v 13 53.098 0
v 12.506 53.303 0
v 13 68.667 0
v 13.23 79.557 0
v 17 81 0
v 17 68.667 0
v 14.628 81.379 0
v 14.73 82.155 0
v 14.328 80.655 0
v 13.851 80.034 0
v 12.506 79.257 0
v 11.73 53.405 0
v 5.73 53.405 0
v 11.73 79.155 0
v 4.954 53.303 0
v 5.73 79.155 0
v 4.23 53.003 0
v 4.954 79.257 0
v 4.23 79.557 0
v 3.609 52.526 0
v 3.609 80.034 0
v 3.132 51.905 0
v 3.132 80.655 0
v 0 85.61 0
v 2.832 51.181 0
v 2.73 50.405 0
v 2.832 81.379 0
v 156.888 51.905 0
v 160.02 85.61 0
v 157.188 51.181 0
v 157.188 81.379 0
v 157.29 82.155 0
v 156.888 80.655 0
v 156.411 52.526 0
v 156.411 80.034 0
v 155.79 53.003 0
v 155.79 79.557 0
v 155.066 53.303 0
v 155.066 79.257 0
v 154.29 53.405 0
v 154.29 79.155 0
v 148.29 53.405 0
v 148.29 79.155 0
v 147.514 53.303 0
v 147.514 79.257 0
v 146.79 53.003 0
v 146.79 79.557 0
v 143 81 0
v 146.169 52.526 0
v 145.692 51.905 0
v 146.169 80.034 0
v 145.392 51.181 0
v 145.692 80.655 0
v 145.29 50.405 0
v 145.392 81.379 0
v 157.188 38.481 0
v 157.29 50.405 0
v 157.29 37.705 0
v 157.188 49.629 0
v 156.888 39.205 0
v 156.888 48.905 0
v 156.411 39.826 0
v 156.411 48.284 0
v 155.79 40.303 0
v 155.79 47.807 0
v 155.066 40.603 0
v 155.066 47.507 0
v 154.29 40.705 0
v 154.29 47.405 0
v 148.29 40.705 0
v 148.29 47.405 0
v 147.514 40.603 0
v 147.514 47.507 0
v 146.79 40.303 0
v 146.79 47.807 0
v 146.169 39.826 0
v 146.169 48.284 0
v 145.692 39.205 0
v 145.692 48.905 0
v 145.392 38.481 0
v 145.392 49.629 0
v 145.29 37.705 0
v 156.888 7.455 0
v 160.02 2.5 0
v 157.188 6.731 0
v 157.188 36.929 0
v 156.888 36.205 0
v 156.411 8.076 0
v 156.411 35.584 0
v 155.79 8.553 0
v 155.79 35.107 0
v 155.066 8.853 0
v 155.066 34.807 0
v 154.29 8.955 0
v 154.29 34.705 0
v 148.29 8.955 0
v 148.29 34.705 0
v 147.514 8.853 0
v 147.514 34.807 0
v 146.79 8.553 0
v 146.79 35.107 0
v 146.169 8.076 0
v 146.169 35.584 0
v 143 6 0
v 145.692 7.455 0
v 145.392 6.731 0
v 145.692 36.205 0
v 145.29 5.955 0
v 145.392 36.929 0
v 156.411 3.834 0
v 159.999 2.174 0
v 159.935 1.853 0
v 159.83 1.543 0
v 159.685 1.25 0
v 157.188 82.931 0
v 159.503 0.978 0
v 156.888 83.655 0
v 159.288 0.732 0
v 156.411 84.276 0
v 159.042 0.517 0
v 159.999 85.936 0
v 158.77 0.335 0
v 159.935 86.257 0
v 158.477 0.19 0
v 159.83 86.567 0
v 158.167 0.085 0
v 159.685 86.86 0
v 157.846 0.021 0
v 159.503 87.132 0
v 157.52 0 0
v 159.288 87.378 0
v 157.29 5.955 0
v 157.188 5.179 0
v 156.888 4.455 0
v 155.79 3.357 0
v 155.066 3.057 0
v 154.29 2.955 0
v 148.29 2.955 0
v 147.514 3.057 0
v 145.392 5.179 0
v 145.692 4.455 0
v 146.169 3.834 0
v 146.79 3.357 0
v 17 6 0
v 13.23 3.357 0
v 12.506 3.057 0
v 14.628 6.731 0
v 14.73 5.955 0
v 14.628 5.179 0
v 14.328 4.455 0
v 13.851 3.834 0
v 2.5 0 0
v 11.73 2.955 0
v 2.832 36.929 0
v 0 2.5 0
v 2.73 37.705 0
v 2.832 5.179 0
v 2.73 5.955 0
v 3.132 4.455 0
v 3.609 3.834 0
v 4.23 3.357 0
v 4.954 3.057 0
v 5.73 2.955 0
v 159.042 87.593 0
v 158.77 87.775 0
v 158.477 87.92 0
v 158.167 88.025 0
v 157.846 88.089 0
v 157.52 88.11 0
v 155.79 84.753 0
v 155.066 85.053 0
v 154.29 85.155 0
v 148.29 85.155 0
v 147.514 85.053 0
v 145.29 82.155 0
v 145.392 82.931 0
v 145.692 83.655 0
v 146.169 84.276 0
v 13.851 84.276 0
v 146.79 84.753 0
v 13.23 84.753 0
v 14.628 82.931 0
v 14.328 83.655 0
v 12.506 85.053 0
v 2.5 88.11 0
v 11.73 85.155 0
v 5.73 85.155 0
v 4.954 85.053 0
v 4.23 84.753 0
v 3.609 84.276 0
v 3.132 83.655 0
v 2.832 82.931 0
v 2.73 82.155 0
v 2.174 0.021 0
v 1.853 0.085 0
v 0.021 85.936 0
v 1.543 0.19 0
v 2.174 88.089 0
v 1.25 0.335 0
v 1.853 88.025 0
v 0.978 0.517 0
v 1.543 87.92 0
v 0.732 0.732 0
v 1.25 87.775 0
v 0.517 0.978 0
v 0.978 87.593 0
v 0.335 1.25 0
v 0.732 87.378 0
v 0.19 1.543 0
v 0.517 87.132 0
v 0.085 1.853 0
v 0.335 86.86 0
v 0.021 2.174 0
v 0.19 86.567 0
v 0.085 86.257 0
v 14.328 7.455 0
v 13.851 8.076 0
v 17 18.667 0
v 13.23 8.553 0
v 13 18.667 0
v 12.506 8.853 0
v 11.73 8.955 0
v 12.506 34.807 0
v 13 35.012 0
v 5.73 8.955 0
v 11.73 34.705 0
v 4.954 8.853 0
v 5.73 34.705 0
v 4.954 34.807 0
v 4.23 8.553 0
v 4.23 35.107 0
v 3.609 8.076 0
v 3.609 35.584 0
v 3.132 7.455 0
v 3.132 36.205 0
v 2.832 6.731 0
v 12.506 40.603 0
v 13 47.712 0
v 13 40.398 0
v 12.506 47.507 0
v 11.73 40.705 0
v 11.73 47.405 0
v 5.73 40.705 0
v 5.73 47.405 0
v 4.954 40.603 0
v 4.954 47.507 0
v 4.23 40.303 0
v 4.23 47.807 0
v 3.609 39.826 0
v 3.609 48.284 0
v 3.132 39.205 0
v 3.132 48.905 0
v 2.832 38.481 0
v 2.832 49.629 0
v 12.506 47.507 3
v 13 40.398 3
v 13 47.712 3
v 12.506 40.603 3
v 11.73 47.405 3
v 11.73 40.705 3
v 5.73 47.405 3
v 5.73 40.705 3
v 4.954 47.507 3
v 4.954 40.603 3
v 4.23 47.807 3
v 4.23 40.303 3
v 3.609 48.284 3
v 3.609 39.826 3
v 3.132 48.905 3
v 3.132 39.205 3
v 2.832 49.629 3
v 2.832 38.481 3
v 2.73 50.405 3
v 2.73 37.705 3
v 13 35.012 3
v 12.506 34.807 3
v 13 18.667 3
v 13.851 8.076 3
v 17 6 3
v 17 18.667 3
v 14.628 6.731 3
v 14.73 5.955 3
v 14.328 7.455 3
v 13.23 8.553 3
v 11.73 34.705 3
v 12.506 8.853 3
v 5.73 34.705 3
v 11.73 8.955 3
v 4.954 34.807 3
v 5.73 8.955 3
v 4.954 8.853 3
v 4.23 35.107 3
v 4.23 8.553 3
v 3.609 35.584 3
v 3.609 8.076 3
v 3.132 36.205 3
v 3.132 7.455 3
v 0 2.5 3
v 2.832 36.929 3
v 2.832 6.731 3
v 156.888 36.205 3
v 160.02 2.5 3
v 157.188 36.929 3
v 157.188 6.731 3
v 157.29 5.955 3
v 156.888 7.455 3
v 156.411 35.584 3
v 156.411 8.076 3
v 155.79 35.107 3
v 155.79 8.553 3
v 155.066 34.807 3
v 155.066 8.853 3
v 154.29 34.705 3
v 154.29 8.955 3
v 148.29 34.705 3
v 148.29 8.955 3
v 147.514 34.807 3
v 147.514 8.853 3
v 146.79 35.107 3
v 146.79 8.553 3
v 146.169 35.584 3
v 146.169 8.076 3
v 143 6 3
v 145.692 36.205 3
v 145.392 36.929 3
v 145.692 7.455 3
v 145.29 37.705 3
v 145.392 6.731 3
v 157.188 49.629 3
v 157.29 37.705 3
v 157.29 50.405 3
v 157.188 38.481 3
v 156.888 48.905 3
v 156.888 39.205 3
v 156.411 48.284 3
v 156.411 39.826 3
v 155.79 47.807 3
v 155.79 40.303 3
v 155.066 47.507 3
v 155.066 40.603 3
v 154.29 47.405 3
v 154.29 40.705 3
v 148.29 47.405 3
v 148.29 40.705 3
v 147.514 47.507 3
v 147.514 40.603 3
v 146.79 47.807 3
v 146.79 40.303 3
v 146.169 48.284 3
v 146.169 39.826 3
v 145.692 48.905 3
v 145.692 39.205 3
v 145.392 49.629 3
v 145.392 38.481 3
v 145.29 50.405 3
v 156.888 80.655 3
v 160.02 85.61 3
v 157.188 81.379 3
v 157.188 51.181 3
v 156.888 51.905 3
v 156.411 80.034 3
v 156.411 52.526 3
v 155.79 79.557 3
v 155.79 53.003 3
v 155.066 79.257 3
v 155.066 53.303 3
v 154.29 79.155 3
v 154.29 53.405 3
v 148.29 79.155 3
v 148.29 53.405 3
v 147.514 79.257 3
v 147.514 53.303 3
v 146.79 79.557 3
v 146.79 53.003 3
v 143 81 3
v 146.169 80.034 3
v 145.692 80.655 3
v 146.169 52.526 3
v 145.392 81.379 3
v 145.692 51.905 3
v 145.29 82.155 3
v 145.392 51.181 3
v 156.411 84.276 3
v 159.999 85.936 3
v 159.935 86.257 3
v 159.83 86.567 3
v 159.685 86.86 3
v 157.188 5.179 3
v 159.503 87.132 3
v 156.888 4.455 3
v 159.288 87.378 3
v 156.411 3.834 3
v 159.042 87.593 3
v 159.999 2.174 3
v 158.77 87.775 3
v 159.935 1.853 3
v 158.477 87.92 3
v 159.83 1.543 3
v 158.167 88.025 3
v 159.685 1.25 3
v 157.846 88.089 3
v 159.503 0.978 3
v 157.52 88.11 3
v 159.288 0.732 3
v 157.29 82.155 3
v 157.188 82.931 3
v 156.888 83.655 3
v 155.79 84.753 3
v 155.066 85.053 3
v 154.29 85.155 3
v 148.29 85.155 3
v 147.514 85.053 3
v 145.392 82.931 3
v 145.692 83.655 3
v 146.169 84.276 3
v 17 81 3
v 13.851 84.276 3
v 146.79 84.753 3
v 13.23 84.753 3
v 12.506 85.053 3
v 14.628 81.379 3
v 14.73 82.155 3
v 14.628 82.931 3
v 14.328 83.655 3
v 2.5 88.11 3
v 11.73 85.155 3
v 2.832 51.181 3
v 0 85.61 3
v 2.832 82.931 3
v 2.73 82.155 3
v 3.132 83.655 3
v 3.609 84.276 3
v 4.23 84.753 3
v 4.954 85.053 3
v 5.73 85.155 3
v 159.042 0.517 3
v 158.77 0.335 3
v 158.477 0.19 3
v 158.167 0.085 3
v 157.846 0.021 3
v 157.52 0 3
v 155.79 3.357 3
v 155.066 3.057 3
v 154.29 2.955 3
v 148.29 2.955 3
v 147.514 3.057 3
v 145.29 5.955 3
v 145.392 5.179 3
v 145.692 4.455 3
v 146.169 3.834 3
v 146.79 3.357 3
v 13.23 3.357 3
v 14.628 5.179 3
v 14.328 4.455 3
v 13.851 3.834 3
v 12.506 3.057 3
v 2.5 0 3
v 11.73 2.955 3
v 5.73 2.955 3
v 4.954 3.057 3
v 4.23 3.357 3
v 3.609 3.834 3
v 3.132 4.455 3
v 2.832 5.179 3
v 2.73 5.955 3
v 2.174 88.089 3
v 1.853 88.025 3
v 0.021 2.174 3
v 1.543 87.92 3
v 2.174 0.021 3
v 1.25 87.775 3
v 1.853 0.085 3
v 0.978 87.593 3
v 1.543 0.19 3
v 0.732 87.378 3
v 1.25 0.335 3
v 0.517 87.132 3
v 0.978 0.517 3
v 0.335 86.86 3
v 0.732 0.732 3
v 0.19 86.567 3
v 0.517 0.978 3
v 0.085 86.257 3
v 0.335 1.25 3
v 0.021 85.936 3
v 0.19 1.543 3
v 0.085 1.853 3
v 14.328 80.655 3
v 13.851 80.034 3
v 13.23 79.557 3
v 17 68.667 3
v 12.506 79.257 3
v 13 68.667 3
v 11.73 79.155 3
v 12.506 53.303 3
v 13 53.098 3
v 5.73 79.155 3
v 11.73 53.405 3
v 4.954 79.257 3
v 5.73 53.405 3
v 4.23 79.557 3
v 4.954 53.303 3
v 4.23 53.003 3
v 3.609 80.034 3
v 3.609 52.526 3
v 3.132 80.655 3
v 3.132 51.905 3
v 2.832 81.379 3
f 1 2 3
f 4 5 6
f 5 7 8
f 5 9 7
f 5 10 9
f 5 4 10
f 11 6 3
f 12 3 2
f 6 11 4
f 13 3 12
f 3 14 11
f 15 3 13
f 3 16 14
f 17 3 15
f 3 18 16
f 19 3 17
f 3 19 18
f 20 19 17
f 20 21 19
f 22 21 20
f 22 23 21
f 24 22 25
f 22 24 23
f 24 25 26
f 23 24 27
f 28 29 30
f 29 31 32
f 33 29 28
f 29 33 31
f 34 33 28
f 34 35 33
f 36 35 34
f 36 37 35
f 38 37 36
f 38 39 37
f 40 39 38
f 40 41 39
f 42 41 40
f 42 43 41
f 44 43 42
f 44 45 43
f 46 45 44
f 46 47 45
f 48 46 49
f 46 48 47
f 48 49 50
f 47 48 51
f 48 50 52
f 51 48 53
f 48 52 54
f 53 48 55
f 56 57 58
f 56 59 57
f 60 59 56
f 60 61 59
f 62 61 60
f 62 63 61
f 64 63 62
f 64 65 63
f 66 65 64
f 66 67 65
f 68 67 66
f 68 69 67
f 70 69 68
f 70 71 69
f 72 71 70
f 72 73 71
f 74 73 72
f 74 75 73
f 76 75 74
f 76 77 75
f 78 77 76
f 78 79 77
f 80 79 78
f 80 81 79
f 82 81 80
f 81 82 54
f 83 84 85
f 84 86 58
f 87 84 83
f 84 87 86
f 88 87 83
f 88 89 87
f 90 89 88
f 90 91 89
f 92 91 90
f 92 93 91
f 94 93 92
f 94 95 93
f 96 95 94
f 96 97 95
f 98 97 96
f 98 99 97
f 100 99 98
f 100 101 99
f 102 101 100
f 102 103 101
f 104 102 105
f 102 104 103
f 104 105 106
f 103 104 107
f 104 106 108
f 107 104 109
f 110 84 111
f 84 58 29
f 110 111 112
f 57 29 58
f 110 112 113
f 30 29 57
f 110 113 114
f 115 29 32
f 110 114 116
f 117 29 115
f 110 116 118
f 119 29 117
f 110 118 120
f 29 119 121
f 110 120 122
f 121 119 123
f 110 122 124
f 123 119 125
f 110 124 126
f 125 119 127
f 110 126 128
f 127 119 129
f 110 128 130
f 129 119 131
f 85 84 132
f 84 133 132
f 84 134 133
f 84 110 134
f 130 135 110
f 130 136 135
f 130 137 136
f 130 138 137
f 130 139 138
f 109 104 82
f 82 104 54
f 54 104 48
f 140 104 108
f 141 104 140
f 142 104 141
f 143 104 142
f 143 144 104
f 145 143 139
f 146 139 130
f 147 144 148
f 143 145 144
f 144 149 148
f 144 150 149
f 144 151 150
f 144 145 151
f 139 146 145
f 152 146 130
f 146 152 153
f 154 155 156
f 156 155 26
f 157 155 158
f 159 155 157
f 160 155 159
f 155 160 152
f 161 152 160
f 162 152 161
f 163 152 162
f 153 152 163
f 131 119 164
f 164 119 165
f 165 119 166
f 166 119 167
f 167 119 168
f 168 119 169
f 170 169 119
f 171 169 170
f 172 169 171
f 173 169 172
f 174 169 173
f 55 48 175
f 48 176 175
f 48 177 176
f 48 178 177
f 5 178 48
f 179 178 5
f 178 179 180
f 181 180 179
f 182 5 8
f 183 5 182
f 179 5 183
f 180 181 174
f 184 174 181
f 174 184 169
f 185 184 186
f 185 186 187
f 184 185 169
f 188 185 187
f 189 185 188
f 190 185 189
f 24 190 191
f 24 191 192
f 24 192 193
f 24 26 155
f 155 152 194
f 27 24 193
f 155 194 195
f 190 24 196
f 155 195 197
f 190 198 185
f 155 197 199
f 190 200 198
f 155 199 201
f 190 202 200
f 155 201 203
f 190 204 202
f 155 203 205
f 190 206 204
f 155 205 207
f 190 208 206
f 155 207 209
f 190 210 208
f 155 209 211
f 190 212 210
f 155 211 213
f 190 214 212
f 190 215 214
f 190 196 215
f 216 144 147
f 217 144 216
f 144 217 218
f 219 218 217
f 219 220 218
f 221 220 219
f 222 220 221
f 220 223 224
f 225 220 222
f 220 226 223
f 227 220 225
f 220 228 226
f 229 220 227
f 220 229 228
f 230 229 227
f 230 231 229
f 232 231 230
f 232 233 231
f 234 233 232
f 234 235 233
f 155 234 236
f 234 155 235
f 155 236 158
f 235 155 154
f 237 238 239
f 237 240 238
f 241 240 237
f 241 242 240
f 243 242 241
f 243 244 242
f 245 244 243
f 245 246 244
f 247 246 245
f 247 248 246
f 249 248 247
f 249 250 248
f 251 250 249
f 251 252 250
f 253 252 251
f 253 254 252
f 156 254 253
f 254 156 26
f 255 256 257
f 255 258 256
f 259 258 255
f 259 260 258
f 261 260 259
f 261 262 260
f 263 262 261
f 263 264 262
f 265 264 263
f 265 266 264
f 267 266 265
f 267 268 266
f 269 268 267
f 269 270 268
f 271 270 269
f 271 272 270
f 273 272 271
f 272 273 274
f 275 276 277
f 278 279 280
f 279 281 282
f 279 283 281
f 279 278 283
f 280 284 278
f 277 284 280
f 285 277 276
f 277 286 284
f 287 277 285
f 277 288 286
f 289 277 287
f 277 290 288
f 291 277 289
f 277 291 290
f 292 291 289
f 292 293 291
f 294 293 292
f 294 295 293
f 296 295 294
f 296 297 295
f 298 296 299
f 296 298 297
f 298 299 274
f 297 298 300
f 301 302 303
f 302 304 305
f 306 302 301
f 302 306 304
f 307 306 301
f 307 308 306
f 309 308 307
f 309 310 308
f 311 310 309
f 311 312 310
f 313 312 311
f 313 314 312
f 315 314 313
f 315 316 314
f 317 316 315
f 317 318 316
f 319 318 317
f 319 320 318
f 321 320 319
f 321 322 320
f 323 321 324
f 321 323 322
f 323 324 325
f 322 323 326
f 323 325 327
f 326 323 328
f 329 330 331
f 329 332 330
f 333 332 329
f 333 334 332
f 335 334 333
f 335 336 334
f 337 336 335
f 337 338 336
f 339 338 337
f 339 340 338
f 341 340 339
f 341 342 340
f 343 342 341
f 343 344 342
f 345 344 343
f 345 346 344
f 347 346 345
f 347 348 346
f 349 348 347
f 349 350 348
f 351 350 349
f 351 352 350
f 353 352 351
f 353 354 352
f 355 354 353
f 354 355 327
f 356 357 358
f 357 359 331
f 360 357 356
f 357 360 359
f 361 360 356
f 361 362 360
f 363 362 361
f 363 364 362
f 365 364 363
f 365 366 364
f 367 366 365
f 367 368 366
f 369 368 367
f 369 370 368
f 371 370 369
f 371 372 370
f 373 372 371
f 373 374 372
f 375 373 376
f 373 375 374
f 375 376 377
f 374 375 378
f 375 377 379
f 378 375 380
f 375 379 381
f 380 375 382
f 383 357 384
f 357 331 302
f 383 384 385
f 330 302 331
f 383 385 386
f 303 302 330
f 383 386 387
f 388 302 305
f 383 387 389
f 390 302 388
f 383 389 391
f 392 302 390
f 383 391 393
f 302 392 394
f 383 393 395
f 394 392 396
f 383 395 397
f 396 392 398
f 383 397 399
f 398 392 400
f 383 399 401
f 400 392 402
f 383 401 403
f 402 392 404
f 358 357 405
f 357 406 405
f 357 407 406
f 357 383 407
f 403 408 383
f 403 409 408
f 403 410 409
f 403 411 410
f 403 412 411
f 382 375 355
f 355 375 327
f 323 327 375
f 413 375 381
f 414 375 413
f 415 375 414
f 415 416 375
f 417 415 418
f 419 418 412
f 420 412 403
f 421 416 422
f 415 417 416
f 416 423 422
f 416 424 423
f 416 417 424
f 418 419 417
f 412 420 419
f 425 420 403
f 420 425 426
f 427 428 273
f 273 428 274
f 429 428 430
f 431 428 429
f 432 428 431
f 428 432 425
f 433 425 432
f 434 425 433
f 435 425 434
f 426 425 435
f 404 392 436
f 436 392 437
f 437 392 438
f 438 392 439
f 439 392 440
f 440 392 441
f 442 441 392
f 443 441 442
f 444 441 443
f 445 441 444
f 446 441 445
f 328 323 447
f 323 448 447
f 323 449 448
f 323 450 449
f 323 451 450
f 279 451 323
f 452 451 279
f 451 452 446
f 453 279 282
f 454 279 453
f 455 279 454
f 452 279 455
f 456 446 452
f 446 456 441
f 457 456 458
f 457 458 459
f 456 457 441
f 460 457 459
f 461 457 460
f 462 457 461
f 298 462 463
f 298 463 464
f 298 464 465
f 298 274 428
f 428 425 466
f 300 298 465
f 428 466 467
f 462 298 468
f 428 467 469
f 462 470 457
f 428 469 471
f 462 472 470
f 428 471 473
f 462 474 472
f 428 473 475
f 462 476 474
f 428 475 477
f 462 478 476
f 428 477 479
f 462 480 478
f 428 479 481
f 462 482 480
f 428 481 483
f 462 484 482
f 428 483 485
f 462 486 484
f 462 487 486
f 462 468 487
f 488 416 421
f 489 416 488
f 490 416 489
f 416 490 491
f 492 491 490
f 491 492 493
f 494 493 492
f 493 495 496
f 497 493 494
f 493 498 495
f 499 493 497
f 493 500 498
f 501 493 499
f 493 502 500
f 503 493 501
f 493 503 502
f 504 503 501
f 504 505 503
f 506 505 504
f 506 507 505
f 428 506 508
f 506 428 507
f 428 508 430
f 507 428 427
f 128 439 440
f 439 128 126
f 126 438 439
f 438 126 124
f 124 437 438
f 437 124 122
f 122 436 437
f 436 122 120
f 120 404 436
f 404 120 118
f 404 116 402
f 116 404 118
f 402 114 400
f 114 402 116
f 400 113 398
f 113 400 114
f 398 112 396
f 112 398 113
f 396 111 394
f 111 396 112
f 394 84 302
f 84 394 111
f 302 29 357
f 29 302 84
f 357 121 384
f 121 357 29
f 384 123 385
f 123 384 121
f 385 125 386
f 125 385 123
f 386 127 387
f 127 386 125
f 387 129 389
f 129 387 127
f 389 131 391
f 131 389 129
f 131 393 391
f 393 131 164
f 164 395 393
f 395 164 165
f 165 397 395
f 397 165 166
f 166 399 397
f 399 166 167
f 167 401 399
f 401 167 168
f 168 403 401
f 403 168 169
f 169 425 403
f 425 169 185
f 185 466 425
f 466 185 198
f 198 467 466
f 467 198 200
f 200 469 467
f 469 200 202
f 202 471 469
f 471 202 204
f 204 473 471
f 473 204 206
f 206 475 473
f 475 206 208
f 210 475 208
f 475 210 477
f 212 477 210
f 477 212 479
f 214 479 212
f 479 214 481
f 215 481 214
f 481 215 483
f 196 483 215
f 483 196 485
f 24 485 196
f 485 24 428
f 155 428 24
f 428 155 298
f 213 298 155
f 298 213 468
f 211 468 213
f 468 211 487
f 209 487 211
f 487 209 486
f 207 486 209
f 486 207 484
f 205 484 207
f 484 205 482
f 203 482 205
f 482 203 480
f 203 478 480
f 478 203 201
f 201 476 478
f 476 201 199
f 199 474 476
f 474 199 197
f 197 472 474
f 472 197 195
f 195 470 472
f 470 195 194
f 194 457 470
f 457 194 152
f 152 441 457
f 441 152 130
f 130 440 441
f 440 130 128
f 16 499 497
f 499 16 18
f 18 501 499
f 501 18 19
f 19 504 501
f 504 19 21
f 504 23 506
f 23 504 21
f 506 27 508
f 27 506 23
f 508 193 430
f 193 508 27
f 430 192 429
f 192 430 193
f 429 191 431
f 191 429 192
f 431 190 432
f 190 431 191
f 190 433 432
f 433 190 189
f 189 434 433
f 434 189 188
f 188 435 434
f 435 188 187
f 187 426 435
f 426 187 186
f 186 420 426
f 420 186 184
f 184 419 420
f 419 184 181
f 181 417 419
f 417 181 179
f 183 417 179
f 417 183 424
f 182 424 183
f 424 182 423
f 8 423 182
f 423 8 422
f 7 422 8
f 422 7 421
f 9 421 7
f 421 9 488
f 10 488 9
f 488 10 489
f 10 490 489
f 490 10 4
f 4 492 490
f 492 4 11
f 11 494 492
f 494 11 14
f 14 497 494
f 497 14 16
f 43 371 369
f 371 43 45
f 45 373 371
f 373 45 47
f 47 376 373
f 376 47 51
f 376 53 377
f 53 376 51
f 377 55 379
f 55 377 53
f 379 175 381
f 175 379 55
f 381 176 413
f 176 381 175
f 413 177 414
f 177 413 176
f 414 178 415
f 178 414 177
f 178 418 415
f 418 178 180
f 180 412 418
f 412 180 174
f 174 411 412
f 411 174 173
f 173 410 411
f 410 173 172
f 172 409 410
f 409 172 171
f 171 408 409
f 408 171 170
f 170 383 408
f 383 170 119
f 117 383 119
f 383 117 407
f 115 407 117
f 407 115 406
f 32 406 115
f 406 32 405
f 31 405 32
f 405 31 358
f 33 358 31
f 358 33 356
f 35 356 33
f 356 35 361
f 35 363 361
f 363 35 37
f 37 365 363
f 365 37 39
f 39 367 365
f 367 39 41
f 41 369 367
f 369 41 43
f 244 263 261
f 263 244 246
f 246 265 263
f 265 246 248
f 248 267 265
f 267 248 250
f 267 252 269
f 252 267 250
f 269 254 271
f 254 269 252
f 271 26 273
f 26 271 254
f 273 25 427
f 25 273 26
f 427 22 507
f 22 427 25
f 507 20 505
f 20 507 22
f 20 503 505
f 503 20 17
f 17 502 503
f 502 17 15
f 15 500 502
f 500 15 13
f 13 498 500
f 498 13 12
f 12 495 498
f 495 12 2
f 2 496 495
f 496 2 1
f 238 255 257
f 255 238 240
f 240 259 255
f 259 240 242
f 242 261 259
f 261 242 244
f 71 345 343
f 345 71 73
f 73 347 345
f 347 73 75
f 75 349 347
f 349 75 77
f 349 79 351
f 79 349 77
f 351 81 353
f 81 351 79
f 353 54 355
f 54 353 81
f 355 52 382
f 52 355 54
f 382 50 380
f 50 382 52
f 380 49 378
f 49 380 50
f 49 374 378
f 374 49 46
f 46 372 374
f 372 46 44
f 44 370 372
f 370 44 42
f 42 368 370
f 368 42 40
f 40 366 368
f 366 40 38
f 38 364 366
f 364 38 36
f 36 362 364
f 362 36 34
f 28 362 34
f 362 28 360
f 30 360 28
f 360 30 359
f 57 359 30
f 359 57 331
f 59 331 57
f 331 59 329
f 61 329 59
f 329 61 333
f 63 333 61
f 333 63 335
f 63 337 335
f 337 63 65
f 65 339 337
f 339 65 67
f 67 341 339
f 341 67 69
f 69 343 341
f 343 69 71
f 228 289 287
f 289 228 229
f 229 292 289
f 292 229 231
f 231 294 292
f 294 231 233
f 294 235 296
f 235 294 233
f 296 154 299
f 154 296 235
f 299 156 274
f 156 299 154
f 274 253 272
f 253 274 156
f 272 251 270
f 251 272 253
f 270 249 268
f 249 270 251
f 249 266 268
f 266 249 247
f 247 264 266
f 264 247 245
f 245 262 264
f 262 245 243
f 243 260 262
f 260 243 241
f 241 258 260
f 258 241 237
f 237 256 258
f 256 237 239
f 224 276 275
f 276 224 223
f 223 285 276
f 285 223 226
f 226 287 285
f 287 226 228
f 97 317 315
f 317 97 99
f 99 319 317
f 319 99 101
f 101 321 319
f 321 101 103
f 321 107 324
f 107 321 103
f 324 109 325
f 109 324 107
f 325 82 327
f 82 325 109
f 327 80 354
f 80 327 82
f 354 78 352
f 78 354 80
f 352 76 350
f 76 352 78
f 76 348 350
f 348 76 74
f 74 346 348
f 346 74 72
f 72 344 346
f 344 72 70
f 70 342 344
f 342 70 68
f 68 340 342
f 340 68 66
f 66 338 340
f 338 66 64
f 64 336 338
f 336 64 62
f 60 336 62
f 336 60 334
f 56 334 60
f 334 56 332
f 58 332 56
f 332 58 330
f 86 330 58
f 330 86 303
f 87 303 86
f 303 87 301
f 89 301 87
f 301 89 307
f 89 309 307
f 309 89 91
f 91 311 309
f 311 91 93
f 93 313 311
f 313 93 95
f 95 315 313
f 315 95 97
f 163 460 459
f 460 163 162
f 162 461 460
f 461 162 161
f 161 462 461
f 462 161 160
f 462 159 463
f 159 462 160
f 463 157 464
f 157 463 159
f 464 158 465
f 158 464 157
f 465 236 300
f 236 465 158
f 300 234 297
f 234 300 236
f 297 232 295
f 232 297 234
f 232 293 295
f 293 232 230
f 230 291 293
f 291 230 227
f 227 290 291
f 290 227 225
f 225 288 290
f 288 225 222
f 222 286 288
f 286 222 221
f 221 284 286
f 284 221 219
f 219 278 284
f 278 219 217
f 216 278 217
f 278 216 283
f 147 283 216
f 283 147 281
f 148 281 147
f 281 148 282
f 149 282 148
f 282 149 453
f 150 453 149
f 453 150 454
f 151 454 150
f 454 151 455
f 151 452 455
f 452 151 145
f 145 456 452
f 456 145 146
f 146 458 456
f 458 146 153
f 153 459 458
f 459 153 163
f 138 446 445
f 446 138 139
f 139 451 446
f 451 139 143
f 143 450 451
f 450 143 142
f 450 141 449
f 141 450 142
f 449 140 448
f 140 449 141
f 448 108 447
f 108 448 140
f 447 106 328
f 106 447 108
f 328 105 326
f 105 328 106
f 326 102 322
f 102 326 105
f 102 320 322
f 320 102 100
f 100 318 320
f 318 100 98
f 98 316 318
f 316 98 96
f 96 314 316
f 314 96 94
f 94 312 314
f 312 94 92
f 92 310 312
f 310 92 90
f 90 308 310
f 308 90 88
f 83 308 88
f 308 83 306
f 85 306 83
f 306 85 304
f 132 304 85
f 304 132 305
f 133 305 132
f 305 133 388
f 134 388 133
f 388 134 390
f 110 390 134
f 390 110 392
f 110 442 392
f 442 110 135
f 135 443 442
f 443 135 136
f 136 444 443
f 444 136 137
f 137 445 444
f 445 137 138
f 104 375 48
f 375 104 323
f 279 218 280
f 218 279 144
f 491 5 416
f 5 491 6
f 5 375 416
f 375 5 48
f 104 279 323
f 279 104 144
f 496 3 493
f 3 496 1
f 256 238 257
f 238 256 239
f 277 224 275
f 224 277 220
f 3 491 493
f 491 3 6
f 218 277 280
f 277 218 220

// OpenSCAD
// file: rack_plate.scad
/**
 * OpenSCAD Rack Plate Library
 * 
 * Conforms to standards defined in Wikipedia for Rack Units (19-inch racks).
 * Formula for height: h = 44.45 * n - 0.79 (mm)
 * Standard mounting width: 465.14 mm (center-to-center)
 */

// --- Default Values ---
DEFAULT_U_COUNT = 1;
DEFAULT_THICKNESS = 3;
DEFAULT_WIDTH_INCHES = 6.5;
DEFAULT_CORNER_RADIUS = 2.5;
DEFAULT_HOLE_DIAMETER = 6;
DEFAULT_SLOT_LENGTH = 12; // At least twice the diameter (6mm * 2)

// --- Modules ---

/**
 * Generates a rack plate.
 * 
 * @param u_count Number of rack units (n)
 * @param thickness Plate thickness in mm
 * @param width_inches Nominal width of the rack in inches (default 19)
 * @param corner_radius Radius for the outer corners in mm
 * @param hole_diameter Diameter of the mounting holes in mm
 * @param slot_length Total length of the oblong mounting holes in mm
 */
module rack_plate(
    u_count = DEFAULT_U_COUNT,
    thickness = DEFAULT_THICKNESS,
    width_inches = DEFAULT_WIDTH_INCHES,
    corner_radius = DEFAULT_CORNER_RADIUS,
    hole_diameter = DEFAULT_HOLE_DIAMETER,
    slot_length = DEFAULT_SLOT_LENGTH
) {
    // Requirements validation
    assert(width_inches >= 5.5 && width_inches <= 23, "Width must be between 5.5 and 23 inches");

    // Constants based on requirements
    u_height_mm = 44.45;
    height_offset_mm = 0.79;
    
    // Formula: h = 44.45 * n - 0.79
    total_height = (u_height_mm * u_count) - height_offset_mm;
    
    // 19-inch rack mounting width (center to center)
    // Wikipedia: 18.313 in = 465.14 mm
    standard_mounting_width = 465.14; 
    standard_total_width = 19 * 25.4; // 482.6 mm
    
    // Total width of the plate. 
    total_width = width_inches * 25.4;
    

    // Flange width calculation (distance from edge to mounting hole center)
    // "It is critical that the mounting holes retain their position relative to the adjacent ends of the panel"
    // For a standard 19" rack, the offset from edge to hole center is:
    edge_to_hole_offset = (standard_total_width - standard_mounting_width) / 2;

    linear_extrude(height = thickness) {
        difference() {
            // Main Plate Body with rounded corners
            rounded_rect(total_width, total_height, corner_radius);

            // Mounting Holes
            // "The code should generate flanges with 2 rather than three holes per 1 U of height."
            if (u_count >= 1) {
                for (u = [0 : floor(u_count) - 1]) {
                    u_base_y = u * u_height_mm;
                    hole_spacing = 31.75; 
                    y_offset = (u_height_mm - hole_spacing) / 2;
                    
                    y_pos1 = u_base_y + y_offset;
                    y_pos2 = u_base_y + y_offset + hole_spacing;
    
                    // Center holes in the total_height
                    // Since total_height = u_count * 44.45 - 0.79, 
                    // the gaps are at the top and bottom of the stack.
                    // We shift everything by (0.79 / 2) to center it if we consider 
                    // the 0.79 to be distributed.
                    // Actually, the previous code had a formula for center_shift.
                    total_nominal_height = u_height_mm * u_count;
                    center_shift = (total_nominal_height - total_height) / 2;
                    
                    p1 = y_pos1 - center_shift;
                    p2 = y_pos2 - center_shift;
    
                    // Left Holes (Oblong)
                    translate([edge_to_hole_offset, p1]) 
                        oblong_hole(hole_diameter, slot_length);
                    translate([edge_to_hole_offset, p2]) 
                        oblong_hole(hole_diameter, slot_length);
                        
                    // Right Holes (Oblong)
                    translate([total_width - edge_to_hole_offset, p1]) 
                        oblong_hole(hole_diameter, slot_length);
                    translate([total_width - edge_to_hole_offset, p2]) 
                        oblong_hole(hole_diameter, slot_length);
                }
            }
        }
    }
}

/**
 * Helper for oblong (slotted) hole
 */
module oblong_hole(d, l) {
    hull() {
        translate([-(l - d) / 2, 0]) circle(d = d, $fn = 24);
        translate([(l - d) / 2, 0]) circle(d = d, $fn = 24);
    }
}

/**
 * Helper for rounded rectangle 2D shape
 */
module rounded_rect(w, h, r) {
    translate([r, r, 0])
    minkowski() {
        square([w - 2 * r, h - 2 * r]);
        circle(r = r, $fn = 48);
    }
}

// --- Example Usage ---
// This will render when the file is opened directly in OpenSCAD
// but won't interfere when included in other files.

rack_plate(u_count = 1, width_inches= 6.5);
// main file
// Simple rack panel for Pi Display 2 (small)
//
// (c) 2026 David M. Witten II
//===================================================================
// Constant Parameters
use <rack_plate.scad>
in2mm               = 25.41;  // mm / in

plate_length        = 6.3;    // inches 123 mm
plate_width         = 160.0;  // mm
plate_thickness     = 3.0;    // mm

left_notch_width    = 4.0;    // mm
left_notch_ht       = 50.0;   // mm

mnt_hole_width      = 7.5;    // mm
mnt_hole_len        = 11.0;   // mm

//===================================================================
// Modifiable Parameters


//===================================================================
// Main()
module cutout()
{
    display_cutout = cube([127, 73, 16]);
}

//===================================================================
// main()
module main()
{
    difference()
    {
        rack_plate(u_count = 2, thickness = plate_thickness, width_inches = plate_length);
        translate([(140 - 123), 6, -8])
        {
            cube([126, 75, 16]);
            //#cutout();
        }
        translate([(140 - 127), (left_notch_ht/3)+2 , -8])
        {
            cube([left_notch_width+ 0.5, left_notch_ht, 16]);
            //#cutout();
        }
    }
}

main();
